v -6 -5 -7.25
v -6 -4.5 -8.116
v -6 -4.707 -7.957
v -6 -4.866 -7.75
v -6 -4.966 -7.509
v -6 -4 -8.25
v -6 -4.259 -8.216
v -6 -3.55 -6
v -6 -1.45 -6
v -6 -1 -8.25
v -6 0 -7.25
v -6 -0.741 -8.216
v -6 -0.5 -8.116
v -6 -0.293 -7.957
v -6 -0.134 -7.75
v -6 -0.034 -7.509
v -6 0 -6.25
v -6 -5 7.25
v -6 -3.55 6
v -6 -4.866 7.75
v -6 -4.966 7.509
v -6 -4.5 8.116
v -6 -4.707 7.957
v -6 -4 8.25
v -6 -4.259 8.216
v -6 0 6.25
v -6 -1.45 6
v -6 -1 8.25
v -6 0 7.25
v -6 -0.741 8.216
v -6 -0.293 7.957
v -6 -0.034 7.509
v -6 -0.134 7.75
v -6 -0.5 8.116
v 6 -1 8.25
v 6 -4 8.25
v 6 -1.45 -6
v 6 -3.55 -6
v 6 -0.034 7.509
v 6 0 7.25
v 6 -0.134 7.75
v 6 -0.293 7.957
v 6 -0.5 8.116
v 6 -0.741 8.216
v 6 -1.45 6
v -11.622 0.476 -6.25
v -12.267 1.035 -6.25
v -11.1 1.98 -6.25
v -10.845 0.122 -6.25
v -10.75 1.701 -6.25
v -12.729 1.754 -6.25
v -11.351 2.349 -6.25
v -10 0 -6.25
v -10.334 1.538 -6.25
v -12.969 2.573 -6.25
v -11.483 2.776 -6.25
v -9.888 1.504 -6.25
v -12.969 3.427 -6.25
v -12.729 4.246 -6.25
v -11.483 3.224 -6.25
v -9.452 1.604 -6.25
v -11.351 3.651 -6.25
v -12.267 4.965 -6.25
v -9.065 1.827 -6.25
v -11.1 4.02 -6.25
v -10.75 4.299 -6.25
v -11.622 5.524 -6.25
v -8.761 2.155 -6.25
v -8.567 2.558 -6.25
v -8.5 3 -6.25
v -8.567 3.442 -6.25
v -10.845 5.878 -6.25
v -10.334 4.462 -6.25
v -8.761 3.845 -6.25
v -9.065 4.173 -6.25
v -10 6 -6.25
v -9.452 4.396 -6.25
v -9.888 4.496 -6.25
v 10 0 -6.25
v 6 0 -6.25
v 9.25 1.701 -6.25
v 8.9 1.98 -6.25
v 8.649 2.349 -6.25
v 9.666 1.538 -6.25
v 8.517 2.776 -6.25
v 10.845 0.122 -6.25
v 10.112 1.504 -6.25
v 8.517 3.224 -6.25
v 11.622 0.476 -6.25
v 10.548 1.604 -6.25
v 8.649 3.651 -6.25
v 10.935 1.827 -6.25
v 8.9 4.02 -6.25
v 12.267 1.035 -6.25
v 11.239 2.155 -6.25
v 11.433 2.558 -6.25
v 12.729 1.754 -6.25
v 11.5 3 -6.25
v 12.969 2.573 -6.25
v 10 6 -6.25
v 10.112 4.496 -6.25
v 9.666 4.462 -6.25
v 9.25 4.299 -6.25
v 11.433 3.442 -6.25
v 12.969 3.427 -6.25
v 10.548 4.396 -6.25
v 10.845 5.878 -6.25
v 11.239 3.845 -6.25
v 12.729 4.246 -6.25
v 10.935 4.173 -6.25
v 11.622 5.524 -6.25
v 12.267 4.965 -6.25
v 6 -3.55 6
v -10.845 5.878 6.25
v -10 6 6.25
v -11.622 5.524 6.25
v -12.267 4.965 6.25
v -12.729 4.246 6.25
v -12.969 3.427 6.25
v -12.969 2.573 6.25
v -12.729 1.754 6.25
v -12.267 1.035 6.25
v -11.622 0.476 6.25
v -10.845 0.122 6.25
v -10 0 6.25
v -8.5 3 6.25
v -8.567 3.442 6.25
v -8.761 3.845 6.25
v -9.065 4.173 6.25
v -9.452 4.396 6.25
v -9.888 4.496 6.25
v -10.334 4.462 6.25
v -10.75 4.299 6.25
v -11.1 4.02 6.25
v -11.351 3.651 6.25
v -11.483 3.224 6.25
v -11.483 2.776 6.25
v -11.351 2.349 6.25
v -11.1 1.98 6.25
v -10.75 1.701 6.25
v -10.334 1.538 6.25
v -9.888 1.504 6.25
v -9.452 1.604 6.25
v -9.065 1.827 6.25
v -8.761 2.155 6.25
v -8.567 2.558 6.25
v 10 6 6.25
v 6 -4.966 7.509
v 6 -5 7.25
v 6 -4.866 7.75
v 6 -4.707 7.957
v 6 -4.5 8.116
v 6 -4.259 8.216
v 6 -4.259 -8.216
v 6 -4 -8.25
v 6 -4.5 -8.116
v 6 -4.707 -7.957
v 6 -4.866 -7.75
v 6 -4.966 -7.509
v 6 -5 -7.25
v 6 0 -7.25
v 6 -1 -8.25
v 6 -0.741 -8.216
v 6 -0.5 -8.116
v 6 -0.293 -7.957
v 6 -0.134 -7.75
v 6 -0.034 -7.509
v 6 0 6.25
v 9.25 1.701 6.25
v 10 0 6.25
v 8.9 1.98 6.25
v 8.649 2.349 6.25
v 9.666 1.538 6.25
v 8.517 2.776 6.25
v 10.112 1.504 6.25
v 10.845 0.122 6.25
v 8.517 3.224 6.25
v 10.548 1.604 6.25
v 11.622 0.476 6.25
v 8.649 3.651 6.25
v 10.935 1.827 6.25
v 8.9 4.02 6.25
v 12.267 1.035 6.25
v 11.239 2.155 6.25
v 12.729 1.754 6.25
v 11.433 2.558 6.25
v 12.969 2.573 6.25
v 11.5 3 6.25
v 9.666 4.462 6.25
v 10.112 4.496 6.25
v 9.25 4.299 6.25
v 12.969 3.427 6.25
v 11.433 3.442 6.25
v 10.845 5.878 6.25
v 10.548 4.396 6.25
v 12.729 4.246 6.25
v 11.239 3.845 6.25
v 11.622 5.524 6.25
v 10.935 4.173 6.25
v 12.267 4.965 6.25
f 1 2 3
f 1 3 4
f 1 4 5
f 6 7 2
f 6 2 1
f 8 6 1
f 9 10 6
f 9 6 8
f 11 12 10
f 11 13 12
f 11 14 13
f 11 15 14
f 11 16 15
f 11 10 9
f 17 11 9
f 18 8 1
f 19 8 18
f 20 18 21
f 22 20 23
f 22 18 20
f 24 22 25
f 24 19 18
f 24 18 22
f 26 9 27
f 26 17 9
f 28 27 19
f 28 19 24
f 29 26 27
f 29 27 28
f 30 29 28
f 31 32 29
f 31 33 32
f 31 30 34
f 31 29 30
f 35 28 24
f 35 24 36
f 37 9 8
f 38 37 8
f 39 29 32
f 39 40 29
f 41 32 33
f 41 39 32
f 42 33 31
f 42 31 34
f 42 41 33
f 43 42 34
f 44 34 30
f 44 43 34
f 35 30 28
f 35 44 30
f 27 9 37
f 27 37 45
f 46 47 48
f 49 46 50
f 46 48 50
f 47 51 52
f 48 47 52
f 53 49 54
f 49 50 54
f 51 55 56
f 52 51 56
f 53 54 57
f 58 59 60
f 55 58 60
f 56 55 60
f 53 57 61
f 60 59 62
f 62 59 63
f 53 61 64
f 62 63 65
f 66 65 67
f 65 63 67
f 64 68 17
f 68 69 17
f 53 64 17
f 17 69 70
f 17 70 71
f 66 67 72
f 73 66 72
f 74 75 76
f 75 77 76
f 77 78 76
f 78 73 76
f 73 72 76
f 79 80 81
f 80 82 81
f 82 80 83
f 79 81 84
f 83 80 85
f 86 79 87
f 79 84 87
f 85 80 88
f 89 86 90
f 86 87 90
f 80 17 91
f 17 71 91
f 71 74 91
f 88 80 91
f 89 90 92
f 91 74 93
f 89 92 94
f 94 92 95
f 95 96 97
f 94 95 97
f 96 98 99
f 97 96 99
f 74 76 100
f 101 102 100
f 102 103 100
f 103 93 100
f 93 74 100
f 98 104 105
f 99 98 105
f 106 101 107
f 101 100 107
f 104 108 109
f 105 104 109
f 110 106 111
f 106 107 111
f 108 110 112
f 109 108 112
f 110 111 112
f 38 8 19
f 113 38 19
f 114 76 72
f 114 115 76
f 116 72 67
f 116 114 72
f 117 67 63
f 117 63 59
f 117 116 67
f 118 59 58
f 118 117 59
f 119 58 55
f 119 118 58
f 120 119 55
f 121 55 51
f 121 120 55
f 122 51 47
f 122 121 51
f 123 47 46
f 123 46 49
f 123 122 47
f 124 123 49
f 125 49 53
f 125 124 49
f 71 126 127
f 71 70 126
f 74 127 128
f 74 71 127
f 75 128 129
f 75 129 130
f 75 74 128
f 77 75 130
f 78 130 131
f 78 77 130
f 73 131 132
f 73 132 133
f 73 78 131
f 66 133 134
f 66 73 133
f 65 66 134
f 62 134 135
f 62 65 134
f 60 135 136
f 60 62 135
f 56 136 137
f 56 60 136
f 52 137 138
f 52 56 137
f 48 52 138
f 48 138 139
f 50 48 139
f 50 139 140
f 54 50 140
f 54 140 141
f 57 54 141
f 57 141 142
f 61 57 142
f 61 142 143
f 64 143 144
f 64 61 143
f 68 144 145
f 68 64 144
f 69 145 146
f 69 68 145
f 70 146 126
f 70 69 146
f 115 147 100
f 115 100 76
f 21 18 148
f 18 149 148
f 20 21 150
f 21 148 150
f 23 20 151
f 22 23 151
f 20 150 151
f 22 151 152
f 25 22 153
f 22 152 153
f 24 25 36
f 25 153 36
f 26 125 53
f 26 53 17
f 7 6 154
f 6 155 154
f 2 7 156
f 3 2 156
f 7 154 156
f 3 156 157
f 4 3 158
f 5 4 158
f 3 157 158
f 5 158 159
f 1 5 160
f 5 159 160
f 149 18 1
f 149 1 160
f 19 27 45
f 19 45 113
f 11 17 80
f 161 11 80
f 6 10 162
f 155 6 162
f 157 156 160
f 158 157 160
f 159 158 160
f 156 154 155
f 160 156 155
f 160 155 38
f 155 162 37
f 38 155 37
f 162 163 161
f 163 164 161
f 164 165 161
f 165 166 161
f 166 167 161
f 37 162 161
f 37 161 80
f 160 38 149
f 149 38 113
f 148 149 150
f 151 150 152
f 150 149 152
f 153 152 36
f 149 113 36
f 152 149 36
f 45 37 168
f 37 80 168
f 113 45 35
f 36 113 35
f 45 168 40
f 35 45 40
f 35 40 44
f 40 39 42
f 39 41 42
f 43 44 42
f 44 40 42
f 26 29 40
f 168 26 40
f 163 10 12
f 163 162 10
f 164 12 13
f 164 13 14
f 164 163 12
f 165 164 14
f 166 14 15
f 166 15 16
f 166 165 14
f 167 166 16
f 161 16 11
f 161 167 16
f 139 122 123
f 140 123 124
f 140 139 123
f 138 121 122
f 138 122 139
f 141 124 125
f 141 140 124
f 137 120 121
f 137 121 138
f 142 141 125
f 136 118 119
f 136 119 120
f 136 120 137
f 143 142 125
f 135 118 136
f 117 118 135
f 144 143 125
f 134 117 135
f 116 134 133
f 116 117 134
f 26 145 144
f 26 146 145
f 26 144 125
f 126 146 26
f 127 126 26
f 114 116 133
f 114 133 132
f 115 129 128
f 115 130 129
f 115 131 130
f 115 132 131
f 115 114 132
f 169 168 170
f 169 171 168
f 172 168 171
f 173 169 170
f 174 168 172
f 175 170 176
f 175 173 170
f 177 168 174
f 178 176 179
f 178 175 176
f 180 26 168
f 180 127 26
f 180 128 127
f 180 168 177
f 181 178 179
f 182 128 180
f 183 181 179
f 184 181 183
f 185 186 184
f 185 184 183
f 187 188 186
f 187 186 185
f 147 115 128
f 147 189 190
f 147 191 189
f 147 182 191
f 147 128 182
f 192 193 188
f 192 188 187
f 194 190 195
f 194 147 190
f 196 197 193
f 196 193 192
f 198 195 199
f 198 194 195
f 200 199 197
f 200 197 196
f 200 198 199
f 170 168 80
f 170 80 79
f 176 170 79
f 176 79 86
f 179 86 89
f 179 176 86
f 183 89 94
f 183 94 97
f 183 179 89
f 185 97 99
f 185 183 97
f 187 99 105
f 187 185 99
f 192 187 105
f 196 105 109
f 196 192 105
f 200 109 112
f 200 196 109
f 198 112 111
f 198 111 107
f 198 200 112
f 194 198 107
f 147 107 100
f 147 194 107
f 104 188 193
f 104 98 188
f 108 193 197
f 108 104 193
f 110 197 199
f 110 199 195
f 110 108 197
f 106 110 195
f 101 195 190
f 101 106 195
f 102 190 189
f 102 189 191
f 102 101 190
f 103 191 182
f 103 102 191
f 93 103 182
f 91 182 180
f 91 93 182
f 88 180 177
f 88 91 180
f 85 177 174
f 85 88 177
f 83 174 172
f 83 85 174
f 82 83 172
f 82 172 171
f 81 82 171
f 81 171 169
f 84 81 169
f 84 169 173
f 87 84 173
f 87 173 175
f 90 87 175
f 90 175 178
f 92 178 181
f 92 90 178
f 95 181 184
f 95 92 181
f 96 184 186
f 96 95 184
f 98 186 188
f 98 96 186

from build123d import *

# Parameters (mm, degrees)
F0_W     = 12
F0_H     = 16.5
F1_DEPTH = 5
F2_R     = 1.5
F3_DEPTH = 6.25
F4_W     = 2.1
F4_H     = 12
F5_DEPTH = 12
F6_R     = 1


with BuildPart() as f1:
    # F0 (on Front) → F1 (new body)
    with BuildSketch(Plane.XZ):
        Rectangle(F0_W, F0_H)
    extrude(amount=F1_DEPTH)

    # F2 (on Top) → F3 (join, symmetric)
    with BuildSketch(Plane.XY):
        with BuildLine():
            Line((-10, 0), (10, 0))
            ThreePointArc((10, 0), (13, 3), (10, 6))
            Line((10, 6), (-10, 6))
            ThreePointArc((-10, 6), (-13, 3), (-10, 0))
        make_face()
        with Locations((-10, 3)):
            Circle(F2_R, mode=Mode.SUBTRACT)
        with Locations((10, 3)):
            Circle(F2_R, mode=Mode.SUBTRACT)
    extrude(amount=F3_DEPTH, both=True)

    # F4 (on face) → F5 (cut, through all)
    with BuildSketch(Plane(origin=(-6, 0, 0), x_dir=(0, -1, 0), z_dir=(-1, 0, 0))):
        with Locations((2.5, 0)):
            Rectangle(F4_W, F4_H)
    extrude(amount=-F5_DEPTH, mode=Mode.SUBTRACT)

    # F6
    f6_edges = [f1.edges().sort_by_distance(p)[0] for p in [
        (0, -5, 8.25),
        (0, 0, 8.25),
        (0, 0, -8.25),
        (0, -5, -8.25),
    ]]
    fillet(f6_edges, radius=F6_R)


solid = f1.part
